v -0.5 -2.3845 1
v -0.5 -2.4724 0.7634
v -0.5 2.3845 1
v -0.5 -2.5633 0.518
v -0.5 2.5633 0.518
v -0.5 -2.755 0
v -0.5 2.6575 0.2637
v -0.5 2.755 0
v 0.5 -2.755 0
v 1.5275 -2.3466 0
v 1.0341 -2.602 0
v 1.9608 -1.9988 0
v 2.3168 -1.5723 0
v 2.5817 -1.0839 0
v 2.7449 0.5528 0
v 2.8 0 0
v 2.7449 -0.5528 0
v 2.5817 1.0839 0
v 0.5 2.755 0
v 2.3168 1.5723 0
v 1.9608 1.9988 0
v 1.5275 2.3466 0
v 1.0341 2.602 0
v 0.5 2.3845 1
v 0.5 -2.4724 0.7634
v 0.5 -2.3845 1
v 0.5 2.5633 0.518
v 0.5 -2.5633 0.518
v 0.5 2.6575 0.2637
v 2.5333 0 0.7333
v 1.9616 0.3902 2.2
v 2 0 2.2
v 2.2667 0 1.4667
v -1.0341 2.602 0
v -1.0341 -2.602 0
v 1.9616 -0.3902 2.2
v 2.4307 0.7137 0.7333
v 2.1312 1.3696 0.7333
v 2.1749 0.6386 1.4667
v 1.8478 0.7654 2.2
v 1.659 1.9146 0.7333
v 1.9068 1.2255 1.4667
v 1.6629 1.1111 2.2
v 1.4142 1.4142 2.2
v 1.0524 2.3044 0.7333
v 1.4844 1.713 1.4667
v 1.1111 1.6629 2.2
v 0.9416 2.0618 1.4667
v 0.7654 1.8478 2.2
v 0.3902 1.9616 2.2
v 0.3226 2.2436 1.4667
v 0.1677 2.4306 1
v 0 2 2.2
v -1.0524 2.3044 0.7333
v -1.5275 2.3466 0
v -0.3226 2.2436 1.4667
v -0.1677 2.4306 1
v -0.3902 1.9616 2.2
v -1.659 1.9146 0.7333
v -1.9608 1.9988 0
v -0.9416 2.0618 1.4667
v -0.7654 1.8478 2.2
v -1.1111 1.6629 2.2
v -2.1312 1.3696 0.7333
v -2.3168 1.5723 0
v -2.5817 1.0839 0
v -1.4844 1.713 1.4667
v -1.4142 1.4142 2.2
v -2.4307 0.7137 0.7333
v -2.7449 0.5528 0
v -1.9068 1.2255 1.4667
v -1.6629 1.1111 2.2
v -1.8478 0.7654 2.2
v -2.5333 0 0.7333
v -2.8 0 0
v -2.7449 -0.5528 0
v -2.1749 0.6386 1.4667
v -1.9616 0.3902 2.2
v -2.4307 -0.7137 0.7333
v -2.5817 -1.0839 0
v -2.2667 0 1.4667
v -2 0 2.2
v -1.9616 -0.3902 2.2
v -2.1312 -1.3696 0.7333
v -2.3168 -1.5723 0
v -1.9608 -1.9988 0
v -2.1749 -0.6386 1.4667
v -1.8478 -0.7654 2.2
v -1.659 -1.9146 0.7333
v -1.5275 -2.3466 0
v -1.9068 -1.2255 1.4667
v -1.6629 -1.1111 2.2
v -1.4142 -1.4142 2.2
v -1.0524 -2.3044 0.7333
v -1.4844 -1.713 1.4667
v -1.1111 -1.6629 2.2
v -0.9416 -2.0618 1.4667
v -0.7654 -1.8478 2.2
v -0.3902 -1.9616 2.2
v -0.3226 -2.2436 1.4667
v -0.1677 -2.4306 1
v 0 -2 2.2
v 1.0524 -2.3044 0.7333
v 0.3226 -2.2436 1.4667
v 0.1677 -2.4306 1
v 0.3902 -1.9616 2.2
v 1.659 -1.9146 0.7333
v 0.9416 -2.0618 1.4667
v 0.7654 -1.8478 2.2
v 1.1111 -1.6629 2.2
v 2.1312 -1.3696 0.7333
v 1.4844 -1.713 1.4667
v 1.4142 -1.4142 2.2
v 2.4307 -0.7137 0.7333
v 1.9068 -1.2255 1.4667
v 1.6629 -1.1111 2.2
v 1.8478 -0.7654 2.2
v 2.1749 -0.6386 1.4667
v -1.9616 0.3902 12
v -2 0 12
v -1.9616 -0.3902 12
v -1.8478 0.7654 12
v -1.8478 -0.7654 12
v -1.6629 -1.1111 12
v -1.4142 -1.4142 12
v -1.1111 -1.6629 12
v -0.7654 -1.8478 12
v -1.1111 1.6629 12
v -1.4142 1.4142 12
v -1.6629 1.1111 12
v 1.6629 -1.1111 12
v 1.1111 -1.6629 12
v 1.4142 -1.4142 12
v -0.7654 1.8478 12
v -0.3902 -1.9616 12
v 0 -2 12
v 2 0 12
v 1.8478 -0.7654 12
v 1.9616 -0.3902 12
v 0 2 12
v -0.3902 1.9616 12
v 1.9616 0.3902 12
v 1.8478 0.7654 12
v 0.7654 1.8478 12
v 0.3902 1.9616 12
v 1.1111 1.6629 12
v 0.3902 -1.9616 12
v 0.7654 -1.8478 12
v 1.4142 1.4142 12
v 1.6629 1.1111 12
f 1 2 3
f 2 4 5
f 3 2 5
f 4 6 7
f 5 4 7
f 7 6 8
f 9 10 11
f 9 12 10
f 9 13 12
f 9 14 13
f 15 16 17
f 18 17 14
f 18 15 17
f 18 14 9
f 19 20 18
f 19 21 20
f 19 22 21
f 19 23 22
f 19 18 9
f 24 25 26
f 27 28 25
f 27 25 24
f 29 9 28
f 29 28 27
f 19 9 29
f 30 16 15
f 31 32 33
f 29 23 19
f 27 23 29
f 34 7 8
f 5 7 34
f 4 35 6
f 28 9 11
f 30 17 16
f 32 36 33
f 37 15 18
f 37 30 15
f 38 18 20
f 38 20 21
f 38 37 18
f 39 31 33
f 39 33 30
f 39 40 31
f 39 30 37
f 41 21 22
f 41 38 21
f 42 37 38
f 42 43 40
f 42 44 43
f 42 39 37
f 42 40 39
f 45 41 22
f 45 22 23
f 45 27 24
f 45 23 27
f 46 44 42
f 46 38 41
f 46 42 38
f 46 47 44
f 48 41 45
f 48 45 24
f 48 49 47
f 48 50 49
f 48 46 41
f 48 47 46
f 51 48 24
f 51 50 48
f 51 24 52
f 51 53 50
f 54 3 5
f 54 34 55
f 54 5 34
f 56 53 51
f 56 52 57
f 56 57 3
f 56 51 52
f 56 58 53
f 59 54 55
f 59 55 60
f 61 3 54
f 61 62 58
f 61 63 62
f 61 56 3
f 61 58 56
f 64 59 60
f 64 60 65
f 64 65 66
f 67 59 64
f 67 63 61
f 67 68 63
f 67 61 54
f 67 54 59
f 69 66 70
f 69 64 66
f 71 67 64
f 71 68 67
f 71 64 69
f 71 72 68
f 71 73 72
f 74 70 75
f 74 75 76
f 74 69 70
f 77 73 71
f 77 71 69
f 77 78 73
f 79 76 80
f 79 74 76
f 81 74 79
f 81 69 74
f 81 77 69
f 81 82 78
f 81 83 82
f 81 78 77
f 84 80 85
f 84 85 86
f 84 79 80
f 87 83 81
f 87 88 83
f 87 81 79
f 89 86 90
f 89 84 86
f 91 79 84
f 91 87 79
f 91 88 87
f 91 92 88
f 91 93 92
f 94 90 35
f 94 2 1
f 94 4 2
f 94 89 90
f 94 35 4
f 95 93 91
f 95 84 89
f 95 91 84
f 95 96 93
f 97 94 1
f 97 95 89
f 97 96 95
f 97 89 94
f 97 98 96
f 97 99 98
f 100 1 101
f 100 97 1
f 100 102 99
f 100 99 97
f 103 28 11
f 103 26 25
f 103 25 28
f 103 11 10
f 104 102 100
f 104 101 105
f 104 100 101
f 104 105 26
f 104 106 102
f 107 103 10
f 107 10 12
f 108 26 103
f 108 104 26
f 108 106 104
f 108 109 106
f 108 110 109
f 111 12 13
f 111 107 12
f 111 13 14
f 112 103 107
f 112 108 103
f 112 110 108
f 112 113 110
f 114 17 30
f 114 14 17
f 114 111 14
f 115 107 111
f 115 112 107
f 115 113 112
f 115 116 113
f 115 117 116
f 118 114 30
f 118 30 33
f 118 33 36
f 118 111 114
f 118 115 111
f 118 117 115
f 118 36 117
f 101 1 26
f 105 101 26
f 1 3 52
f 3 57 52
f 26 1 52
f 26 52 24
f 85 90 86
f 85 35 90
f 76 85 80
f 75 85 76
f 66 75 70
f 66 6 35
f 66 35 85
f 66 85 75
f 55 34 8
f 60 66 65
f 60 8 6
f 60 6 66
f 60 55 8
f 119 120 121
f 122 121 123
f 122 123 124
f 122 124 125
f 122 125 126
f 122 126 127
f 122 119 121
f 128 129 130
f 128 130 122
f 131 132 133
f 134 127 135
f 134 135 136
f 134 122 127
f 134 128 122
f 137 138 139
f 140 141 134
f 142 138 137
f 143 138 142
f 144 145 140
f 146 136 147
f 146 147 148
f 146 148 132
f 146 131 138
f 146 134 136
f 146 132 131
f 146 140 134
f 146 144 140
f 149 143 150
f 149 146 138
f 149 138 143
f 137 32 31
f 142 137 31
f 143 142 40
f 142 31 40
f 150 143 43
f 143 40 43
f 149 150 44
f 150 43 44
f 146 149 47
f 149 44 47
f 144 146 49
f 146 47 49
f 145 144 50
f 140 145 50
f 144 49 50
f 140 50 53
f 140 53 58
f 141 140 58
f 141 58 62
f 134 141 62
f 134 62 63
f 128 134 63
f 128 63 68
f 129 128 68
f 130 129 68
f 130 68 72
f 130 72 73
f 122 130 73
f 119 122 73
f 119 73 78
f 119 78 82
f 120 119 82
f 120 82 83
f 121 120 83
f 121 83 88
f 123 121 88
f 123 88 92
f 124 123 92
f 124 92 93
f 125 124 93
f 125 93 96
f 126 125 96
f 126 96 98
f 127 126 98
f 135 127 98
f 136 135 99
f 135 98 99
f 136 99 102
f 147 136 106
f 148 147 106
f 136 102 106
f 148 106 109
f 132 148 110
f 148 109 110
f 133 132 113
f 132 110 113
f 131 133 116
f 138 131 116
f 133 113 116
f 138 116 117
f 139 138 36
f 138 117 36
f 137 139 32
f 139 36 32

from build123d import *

# Parameters (mm, degrees)
BOX_W          = 1
BOX_H          = 10
BOX_DEPTH      = 1
CYLINDER_R     = 2
CYLINDER_DEPTH = 10


with BuildPart() as cube:
    # Box → Box (new body)
    with BuildSketch(Plane(origin=(-0.5, -5, 0), x_dir=(1, 0, 0), z_dir=(0, 0, 1))):
        with Locations((0.5, 5)):
            Rectangle(BOX_W, BOX_H)
    extrude(amount=BOX_DEPTH)


with BuildPart() as cut:
    # Cone → Cone (revolve)
    with BuildSketch(Plane.XZ):
        Polygon((0, 0), (2.8, 0), (2, 2.2), (0, 2.2), align=None)
    revolve(axis=Axis((0, 0, 0), (0, 0, 1)))

    # Cut: cut Cube
    add(cube.part, mode=Mode.SUBTRACT)


with BuildPart() as fusion:
    # Cylinder → Cylinder (new body)
    with BuildSketch(Plane.XY.offset(2)):
        Circle(CYLINDER_R)
    extrude(amount=CYLINDER_DEPTH)

    # Fusion: union Cut
    add(cut.part)


solid = fusion.part
